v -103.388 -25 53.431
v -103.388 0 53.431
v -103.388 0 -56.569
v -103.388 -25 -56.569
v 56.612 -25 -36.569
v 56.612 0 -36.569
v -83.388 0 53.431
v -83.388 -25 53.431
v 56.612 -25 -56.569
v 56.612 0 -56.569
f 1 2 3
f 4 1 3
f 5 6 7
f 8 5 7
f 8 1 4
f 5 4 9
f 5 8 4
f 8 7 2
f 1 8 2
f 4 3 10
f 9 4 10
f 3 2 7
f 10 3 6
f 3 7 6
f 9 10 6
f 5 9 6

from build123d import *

# Parameters (mm, degrees)
F1_DEPTH = 25
F2_DEPTH = 25
F3_DEPTH = 25
F4_DEPTH = 25
F5_DEPTH = 25


with BuildPart() as f1:
    # F0 (on Front) → F1 (new body)
    with BuildSketch(Plane.XZ):
        Polygon((-83.388145, 53.431101), (-103.388145, 53.431101), (-103.388145, -56.568899), (56.611855, -56.568899), (56.611855, -36.568899), align=None)
    extrude(amount=F1_DEPTH)

    # F0 (on Front) → F2 (join)
    with BuildSketch(Plane.XZ):
        Polygon((-83.388145, 53.431101), (-103.388145, 53.431101), (-103.388145, -56.568899), (56.611855, -56.568899), (56.611855, -36.568899), align=None)
    extrude(amount=F2_DEPTH)

    # F0 (on Front) → F3 (join)
    with BuildSketch(Plane.XZ):
        Polygon((-83.388145, 53.431101), (-103.388145, 53.431101), (-103.388145, -56.568899), (56.611855, -56.568899), (56.611855, -36.568899), align=None)
    extrude(amount=F3_DEPTH)

    # F0 (on Front) → F4 (join)
    with BuildSketch(Plane.XZ):
        Polygon((-83.388145, 53.431101), (-103.388145, 53.431101), (-103.388145, -56.568899), (56.611855, -56.568899), (56.611855, -36.568899), align=None)
    extrude(amount=F4_DEPTH)

    # F0 (on Front) → F5 (join)
    with BuildSketch(Plane.XZ):
        Polygon((-83.388145, 53.431101), (-103.388145, 53.431101), (-103.388145, -56.568899), (56.611855, -56.568899), (56.611855, -36.568899), align=None)
    extrude(amount=F5_DEPTH)


solid = f1.part
